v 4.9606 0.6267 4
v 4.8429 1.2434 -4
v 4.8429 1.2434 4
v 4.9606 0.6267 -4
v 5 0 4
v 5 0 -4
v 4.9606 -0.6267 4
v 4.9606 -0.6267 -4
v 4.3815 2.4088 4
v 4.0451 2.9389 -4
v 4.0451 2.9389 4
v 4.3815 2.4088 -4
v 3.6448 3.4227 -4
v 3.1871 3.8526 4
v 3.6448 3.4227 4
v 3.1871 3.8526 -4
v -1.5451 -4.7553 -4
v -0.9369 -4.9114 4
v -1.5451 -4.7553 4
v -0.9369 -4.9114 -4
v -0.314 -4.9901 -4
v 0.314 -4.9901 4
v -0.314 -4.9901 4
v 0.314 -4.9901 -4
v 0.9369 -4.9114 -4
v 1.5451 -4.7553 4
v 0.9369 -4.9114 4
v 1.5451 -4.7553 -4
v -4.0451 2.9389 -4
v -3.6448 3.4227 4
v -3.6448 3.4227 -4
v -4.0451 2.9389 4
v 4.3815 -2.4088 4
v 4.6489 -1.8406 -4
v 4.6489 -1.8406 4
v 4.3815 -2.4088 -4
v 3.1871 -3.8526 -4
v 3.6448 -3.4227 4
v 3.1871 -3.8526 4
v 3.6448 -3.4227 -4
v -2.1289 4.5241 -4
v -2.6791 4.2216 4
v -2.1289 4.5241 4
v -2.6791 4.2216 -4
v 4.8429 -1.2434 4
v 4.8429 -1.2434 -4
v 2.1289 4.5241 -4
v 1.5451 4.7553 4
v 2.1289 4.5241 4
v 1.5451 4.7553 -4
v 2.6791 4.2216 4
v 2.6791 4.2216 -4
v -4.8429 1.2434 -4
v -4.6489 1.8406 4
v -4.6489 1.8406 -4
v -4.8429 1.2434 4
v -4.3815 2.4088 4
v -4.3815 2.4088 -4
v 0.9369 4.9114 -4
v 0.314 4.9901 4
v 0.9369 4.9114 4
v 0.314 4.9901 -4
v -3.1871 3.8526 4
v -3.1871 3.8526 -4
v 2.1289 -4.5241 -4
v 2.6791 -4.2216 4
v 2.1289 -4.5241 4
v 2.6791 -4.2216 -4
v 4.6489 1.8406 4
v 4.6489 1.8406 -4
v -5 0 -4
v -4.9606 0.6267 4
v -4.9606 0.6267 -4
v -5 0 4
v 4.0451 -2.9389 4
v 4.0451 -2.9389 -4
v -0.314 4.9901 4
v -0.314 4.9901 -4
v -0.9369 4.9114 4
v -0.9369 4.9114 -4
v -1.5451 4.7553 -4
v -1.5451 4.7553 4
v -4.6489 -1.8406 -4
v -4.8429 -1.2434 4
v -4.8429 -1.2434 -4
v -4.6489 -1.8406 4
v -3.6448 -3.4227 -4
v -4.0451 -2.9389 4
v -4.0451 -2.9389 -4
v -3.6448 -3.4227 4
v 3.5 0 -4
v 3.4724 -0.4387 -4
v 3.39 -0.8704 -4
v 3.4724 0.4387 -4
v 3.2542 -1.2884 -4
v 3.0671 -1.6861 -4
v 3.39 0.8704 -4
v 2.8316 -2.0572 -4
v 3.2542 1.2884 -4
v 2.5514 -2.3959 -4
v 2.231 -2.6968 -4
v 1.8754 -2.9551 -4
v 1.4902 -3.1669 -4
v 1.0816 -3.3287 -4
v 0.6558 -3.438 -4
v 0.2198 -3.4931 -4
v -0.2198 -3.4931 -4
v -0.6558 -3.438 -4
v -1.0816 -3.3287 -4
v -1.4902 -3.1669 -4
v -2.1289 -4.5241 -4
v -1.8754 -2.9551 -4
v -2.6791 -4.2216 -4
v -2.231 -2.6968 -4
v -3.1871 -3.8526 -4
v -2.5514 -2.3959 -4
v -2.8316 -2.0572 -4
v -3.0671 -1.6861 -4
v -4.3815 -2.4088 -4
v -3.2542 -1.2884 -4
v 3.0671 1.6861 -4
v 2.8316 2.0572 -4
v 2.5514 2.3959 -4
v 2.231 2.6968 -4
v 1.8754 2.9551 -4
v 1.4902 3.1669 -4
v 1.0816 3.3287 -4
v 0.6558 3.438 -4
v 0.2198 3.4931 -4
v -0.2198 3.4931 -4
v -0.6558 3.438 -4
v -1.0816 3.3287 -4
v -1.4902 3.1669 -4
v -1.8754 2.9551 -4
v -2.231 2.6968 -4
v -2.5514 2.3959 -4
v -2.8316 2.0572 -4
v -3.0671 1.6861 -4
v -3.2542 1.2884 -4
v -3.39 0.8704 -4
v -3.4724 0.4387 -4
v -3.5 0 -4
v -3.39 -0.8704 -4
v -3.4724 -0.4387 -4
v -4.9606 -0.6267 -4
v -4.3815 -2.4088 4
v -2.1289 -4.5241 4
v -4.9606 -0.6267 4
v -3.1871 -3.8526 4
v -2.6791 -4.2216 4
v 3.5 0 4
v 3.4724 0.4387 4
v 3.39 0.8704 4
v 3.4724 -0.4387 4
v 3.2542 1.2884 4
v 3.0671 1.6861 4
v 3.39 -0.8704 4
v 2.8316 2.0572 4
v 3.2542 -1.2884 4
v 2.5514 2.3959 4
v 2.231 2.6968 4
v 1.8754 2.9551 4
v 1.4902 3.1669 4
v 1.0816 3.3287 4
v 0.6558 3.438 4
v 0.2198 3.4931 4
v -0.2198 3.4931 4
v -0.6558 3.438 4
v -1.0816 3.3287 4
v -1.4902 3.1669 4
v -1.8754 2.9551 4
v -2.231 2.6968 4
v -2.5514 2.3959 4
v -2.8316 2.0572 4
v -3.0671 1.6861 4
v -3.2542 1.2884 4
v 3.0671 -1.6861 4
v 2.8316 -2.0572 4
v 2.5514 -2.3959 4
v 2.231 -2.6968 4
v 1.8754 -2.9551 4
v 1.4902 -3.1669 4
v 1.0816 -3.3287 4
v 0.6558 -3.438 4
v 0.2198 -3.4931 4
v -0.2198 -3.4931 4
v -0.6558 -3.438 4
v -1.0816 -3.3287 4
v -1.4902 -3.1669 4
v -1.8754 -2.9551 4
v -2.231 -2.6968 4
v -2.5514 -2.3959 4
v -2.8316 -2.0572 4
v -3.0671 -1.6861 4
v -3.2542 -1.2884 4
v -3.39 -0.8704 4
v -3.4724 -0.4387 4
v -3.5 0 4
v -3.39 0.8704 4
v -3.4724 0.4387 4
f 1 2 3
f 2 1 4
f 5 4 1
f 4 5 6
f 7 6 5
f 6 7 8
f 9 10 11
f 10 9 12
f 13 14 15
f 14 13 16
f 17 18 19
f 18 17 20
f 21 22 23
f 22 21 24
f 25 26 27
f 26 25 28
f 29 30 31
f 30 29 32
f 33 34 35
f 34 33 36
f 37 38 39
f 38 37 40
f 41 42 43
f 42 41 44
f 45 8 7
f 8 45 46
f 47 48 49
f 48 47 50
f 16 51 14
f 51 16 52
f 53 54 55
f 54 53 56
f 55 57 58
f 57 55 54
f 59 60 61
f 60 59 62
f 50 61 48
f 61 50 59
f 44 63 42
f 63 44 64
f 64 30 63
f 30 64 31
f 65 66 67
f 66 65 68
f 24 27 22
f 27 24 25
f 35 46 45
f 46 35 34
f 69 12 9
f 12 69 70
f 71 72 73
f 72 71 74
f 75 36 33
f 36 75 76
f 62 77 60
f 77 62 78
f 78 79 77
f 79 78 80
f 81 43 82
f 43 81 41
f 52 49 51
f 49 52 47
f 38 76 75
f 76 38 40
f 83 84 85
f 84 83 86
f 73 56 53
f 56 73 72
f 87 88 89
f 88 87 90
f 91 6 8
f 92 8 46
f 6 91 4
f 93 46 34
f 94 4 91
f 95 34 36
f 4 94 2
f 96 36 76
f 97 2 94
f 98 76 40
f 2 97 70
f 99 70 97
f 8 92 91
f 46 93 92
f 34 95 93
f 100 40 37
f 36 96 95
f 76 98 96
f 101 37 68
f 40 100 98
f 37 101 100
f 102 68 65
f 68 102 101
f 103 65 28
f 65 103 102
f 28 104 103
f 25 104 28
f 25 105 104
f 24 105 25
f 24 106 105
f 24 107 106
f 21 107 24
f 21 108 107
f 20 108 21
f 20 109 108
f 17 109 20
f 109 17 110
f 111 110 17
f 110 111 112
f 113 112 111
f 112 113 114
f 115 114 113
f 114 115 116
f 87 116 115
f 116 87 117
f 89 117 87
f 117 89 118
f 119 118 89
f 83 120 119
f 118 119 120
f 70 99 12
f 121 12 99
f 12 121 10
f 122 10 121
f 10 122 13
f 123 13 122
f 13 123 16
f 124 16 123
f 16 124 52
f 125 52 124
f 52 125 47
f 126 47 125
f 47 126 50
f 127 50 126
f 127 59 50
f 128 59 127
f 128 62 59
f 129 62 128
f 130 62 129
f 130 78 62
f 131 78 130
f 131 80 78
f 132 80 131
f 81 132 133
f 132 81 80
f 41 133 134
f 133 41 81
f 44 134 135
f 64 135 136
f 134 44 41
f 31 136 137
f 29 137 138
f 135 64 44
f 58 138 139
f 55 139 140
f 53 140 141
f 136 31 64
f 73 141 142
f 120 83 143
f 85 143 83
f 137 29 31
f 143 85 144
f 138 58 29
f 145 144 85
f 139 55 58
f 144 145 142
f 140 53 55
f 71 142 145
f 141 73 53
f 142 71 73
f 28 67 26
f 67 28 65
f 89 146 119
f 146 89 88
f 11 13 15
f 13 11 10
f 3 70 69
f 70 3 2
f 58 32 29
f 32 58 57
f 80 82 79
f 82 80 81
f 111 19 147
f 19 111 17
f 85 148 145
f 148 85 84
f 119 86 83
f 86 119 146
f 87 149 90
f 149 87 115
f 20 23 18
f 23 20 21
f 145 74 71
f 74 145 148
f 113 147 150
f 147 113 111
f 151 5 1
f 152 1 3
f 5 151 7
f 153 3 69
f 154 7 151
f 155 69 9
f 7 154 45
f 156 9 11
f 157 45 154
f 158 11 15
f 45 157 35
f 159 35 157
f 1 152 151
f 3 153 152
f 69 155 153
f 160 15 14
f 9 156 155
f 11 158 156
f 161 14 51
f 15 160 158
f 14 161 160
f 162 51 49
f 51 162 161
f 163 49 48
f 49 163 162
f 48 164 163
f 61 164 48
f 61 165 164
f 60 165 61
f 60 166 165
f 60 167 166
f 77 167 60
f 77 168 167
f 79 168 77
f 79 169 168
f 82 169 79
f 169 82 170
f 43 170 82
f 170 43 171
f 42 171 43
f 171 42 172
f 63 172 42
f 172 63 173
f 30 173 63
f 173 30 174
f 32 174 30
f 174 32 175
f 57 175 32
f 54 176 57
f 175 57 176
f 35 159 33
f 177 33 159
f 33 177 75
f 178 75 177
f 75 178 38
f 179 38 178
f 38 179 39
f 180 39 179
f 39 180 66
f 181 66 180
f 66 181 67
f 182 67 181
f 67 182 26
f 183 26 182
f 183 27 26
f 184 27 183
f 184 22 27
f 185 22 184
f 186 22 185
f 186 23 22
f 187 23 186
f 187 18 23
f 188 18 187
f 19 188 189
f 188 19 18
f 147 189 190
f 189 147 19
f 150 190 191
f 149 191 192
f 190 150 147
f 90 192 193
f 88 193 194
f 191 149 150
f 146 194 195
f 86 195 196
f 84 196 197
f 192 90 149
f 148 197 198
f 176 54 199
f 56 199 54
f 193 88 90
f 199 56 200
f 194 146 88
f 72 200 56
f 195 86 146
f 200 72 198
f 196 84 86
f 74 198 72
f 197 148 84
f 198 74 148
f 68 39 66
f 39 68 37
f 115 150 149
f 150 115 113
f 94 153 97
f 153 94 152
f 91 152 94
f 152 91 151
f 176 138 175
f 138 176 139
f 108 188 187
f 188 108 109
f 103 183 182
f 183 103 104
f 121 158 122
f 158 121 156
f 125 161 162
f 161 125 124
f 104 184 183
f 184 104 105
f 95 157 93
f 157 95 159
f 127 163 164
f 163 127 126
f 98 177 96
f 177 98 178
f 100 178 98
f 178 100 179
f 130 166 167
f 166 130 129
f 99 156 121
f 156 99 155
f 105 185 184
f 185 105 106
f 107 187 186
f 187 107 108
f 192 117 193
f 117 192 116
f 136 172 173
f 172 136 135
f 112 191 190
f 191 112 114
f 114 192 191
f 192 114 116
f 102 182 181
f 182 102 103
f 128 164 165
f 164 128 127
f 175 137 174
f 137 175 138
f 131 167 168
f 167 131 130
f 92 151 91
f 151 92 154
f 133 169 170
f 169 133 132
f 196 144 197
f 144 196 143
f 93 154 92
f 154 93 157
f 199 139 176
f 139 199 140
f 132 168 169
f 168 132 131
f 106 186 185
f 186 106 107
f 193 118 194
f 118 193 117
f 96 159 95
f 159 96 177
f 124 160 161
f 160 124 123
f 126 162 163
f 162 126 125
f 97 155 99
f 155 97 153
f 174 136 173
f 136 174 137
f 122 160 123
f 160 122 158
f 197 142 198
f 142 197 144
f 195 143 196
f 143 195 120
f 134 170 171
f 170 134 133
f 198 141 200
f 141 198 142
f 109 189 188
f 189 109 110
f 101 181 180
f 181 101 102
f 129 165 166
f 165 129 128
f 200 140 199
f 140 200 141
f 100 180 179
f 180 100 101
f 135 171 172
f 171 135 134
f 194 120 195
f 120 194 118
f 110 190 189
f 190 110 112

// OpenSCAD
$fn = 50;


difference() {
	union() {
		translate(v = [0, 0, -4.0000000000]) {
			cylinder(h = 8, r = 5.0000000000);
		}
	}
	union() {
		translate(v = [0, 0, -100.0000000000]) {
			cylinder(h = 200, r = 3.5000000000);
		}
	}
}
